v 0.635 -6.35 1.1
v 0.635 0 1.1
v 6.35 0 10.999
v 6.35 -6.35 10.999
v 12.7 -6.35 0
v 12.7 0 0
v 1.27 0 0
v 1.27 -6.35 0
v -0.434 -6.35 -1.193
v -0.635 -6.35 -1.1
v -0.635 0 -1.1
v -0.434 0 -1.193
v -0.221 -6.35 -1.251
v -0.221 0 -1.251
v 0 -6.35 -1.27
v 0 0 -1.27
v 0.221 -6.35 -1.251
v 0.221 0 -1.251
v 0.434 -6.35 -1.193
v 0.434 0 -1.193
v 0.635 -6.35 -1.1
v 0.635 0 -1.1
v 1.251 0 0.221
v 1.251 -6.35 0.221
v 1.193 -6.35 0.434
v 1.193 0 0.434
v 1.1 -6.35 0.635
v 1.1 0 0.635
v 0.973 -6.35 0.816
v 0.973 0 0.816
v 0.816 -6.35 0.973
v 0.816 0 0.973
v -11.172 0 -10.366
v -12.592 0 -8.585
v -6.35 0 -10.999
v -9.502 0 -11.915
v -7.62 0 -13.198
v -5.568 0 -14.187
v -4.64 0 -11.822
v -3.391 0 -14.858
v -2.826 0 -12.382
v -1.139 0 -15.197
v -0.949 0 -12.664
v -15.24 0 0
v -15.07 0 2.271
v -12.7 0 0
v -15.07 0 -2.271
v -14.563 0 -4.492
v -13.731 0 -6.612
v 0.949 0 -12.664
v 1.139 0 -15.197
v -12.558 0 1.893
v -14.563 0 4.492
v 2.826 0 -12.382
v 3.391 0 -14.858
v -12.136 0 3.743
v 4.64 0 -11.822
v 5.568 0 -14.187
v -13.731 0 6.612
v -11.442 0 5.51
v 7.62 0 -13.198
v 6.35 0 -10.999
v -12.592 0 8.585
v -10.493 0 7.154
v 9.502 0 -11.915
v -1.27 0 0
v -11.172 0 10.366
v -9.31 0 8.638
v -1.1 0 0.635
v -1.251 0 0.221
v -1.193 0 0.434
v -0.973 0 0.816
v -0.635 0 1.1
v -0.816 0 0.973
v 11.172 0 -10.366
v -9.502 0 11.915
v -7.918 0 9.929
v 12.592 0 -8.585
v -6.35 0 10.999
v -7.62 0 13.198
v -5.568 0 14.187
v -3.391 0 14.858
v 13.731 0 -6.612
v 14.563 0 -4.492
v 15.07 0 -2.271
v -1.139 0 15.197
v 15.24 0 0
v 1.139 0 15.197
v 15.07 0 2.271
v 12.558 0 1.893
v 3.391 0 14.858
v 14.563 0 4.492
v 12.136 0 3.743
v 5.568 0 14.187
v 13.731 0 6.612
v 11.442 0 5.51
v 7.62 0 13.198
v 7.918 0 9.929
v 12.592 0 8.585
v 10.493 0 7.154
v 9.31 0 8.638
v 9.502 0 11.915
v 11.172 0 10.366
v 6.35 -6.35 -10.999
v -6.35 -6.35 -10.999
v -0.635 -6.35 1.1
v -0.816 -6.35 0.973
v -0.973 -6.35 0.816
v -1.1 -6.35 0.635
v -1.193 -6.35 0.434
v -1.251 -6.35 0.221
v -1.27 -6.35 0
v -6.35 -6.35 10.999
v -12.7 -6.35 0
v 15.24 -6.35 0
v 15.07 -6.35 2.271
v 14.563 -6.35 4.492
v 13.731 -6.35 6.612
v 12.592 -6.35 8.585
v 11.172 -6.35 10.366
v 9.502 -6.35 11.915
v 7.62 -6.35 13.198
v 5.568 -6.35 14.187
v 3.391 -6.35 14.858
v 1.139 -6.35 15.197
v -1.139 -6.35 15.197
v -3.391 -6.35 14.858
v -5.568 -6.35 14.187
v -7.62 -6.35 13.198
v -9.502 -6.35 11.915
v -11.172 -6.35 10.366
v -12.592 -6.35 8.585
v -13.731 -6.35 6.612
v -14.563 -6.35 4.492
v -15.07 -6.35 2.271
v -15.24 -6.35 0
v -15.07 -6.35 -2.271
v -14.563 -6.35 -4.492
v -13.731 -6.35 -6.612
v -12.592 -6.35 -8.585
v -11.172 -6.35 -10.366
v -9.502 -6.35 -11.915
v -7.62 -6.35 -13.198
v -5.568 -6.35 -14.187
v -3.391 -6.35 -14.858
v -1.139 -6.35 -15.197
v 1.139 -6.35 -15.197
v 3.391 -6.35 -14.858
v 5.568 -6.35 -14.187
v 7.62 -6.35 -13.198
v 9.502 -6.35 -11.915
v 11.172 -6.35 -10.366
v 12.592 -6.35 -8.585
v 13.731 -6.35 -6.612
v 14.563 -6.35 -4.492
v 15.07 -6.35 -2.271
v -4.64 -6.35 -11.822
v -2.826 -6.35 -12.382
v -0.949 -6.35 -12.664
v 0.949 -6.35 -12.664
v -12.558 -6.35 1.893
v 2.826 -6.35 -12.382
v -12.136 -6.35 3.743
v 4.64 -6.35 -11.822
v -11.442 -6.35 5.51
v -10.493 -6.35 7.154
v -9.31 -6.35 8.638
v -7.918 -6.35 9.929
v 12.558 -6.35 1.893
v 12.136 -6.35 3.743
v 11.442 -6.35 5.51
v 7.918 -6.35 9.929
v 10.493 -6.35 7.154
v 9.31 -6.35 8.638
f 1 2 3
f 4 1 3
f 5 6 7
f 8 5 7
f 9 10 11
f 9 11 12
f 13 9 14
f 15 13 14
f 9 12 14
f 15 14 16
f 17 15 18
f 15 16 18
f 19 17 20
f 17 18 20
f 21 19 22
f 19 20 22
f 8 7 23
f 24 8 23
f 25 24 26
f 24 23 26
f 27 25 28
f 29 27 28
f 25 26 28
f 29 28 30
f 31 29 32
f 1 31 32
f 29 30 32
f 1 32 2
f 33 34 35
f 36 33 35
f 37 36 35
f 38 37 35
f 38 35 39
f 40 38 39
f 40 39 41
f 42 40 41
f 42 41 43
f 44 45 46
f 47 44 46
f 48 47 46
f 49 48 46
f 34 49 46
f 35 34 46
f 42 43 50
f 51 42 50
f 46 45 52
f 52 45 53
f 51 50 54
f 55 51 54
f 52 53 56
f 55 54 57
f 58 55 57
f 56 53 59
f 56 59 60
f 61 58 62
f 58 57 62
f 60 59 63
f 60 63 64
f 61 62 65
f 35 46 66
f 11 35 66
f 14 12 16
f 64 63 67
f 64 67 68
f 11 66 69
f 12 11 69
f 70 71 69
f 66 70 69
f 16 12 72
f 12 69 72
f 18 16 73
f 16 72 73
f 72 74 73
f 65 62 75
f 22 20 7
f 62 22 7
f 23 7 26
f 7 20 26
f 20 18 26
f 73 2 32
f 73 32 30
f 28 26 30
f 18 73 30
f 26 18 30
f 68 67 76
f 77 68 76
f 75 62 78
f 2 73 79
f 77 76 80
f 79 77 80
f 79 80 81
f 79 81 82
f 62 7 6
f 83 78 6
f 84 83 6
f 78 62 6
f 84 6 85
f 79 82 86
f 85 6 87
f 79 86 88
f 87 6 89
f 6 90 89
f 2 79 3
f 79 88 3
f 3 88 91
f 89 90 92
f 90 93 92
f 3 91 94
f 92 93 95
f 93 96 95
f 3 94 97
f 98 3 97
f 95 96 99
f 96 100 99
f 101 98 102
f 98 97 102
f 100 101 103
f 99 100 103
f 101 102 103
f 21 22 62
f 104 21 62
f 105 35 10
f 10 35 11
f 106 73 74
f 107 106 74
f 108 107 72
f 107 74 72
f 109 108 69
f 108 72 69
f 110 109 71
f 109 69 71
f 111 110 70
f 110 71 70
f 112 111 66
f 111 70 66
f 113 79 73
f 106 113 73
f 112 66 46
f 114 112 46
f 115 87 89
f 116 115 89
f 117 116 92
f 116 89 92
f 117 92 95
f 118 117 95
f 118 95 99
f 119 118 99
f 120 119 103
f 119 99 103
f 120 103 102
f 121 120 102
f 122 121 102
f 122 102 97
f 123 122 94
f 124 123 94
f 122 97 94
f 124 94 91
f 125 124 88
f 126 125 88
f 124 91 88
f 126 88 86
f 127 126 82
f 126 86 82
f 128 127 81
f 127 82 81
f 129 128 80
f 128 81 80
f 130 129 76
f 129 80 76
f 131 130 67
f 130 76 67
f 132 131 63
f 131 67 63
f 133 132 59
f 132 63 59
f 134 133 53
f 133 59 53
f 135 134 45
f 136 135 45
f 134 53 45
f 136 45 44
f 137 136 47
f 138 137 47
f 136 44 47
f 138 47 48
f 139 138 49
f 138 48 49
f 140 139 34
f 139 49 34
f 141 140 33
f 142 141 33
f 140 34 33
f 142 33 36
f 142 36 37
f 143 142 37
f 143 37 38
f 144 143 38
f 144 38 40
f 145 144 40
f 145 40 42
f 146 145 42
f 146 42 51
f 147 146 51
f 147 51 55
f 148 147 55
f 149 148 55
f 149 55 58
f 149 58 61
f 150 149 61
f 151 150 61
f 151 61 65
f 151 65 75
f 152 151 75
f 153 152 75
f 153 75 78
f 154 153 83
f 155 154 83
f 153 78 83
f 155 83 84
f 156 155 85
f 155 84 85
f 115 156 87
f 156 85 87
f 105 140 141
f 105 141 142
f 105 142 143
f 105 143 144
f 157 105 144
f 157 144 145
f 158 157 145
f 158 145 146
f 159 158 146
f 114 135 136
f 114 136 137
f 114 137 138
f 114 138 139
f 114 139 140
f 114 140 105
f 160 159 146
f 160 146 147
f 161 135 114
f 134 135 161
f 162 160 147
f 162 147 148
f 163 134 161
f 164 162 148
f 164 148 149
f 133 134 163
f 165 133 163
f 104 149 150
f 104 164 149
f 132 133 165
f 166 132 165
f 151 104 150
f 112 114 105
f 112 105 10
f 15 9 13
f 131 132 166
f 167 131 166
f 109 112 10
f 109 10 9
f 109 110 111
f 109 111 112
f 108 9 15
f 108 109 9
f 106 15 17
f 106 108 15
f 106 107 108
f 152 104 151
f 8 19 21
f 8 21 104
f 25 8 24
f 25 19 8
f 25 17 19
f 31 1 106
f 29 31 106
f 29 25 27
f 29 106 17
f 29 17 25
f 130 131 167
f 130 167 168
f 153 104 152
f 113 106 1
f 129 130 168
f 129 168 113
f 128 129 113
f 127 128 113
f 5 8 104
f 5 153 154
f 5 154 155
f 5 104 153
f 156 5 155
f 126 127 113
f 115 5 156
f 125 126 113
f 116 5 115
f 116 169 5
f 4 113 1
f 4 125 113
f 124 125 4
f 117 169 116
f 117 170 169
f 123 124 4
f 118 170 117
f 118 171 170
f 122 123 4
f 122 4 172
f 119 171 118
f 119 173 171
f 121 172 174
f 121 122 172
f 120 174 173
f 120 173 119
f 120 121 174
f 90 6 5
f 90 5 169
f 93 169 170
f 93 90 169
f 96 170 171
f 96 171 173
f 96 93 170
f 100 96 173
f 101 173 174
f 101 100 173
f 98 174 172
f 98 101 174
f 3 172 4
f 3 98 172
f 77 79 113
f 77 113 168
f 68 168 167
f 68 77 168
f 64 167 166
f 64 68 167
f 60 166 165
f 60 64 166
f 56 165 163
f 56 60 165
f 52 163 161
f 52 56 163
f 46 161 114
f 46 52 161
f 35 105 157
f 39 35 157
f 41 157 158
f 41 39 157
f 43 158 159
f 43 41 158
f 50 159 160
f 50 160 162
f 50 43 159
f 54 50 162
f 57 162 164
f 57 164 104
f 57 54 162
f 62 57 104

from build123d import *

# Parameters (mm, degrees)
F1_DEPTH = 6.35
F2_R     = 15.24
F2_R_2   = 12.7
F3_DEPTH = 6.35
F4_R     = 1.27
F5_DEPTH = 6.35


with BuildPart() as f1:
    # F0 (on Front) → F1 (new body)
    with BuildSketch(Plane.XZ):
        Polygon((7.3323484187, 12.7), (-7.3323484187, 12.7), (0, 0), align=None)
    extrude(amount=F1_DEPTH)



with BuildPart() as f1b:
    # F0 (on Front) → F1, piece 2 (new body)
    with BuildSketch(Plane.XZ):
        Polygon((0, 0), (-14.6646968374, 0), (-7.3323484187, -12.7), align=None)
    extrude(amount=F1_DEPTH)


with BuildPart() as f1c:
    # F0 (on Front) → F1, piece 3 (new body)
    with BuildSketch(Plane.XZ):
        Polygon((14.6646968374, 0), (0, 0), (7.3323484187, -12.7), align=None)
    extrude(amount=F1_DEPTH)


with BuildPart() as f1_1:
    add(f1.part)

    add(f1b.part)  # F3 merges F1b

    add(f1c.part)  # F3 merges F1c
    # F2 (on Front) → F3 (join)
    with BuildSketch(Plane.XZ):
        Circle(F2_R)
        Circle(F2_R_2, mode=Mode.SUBTRACT)
    extrude(amount=F3_DEPTH)

    # F4 (on Front) → F5 (join)
    with BuildSketch(Plane.XZ):
        Circle(F4_R)
    extrude(amount=F5_DEPTH)


solid = f1_1.part
